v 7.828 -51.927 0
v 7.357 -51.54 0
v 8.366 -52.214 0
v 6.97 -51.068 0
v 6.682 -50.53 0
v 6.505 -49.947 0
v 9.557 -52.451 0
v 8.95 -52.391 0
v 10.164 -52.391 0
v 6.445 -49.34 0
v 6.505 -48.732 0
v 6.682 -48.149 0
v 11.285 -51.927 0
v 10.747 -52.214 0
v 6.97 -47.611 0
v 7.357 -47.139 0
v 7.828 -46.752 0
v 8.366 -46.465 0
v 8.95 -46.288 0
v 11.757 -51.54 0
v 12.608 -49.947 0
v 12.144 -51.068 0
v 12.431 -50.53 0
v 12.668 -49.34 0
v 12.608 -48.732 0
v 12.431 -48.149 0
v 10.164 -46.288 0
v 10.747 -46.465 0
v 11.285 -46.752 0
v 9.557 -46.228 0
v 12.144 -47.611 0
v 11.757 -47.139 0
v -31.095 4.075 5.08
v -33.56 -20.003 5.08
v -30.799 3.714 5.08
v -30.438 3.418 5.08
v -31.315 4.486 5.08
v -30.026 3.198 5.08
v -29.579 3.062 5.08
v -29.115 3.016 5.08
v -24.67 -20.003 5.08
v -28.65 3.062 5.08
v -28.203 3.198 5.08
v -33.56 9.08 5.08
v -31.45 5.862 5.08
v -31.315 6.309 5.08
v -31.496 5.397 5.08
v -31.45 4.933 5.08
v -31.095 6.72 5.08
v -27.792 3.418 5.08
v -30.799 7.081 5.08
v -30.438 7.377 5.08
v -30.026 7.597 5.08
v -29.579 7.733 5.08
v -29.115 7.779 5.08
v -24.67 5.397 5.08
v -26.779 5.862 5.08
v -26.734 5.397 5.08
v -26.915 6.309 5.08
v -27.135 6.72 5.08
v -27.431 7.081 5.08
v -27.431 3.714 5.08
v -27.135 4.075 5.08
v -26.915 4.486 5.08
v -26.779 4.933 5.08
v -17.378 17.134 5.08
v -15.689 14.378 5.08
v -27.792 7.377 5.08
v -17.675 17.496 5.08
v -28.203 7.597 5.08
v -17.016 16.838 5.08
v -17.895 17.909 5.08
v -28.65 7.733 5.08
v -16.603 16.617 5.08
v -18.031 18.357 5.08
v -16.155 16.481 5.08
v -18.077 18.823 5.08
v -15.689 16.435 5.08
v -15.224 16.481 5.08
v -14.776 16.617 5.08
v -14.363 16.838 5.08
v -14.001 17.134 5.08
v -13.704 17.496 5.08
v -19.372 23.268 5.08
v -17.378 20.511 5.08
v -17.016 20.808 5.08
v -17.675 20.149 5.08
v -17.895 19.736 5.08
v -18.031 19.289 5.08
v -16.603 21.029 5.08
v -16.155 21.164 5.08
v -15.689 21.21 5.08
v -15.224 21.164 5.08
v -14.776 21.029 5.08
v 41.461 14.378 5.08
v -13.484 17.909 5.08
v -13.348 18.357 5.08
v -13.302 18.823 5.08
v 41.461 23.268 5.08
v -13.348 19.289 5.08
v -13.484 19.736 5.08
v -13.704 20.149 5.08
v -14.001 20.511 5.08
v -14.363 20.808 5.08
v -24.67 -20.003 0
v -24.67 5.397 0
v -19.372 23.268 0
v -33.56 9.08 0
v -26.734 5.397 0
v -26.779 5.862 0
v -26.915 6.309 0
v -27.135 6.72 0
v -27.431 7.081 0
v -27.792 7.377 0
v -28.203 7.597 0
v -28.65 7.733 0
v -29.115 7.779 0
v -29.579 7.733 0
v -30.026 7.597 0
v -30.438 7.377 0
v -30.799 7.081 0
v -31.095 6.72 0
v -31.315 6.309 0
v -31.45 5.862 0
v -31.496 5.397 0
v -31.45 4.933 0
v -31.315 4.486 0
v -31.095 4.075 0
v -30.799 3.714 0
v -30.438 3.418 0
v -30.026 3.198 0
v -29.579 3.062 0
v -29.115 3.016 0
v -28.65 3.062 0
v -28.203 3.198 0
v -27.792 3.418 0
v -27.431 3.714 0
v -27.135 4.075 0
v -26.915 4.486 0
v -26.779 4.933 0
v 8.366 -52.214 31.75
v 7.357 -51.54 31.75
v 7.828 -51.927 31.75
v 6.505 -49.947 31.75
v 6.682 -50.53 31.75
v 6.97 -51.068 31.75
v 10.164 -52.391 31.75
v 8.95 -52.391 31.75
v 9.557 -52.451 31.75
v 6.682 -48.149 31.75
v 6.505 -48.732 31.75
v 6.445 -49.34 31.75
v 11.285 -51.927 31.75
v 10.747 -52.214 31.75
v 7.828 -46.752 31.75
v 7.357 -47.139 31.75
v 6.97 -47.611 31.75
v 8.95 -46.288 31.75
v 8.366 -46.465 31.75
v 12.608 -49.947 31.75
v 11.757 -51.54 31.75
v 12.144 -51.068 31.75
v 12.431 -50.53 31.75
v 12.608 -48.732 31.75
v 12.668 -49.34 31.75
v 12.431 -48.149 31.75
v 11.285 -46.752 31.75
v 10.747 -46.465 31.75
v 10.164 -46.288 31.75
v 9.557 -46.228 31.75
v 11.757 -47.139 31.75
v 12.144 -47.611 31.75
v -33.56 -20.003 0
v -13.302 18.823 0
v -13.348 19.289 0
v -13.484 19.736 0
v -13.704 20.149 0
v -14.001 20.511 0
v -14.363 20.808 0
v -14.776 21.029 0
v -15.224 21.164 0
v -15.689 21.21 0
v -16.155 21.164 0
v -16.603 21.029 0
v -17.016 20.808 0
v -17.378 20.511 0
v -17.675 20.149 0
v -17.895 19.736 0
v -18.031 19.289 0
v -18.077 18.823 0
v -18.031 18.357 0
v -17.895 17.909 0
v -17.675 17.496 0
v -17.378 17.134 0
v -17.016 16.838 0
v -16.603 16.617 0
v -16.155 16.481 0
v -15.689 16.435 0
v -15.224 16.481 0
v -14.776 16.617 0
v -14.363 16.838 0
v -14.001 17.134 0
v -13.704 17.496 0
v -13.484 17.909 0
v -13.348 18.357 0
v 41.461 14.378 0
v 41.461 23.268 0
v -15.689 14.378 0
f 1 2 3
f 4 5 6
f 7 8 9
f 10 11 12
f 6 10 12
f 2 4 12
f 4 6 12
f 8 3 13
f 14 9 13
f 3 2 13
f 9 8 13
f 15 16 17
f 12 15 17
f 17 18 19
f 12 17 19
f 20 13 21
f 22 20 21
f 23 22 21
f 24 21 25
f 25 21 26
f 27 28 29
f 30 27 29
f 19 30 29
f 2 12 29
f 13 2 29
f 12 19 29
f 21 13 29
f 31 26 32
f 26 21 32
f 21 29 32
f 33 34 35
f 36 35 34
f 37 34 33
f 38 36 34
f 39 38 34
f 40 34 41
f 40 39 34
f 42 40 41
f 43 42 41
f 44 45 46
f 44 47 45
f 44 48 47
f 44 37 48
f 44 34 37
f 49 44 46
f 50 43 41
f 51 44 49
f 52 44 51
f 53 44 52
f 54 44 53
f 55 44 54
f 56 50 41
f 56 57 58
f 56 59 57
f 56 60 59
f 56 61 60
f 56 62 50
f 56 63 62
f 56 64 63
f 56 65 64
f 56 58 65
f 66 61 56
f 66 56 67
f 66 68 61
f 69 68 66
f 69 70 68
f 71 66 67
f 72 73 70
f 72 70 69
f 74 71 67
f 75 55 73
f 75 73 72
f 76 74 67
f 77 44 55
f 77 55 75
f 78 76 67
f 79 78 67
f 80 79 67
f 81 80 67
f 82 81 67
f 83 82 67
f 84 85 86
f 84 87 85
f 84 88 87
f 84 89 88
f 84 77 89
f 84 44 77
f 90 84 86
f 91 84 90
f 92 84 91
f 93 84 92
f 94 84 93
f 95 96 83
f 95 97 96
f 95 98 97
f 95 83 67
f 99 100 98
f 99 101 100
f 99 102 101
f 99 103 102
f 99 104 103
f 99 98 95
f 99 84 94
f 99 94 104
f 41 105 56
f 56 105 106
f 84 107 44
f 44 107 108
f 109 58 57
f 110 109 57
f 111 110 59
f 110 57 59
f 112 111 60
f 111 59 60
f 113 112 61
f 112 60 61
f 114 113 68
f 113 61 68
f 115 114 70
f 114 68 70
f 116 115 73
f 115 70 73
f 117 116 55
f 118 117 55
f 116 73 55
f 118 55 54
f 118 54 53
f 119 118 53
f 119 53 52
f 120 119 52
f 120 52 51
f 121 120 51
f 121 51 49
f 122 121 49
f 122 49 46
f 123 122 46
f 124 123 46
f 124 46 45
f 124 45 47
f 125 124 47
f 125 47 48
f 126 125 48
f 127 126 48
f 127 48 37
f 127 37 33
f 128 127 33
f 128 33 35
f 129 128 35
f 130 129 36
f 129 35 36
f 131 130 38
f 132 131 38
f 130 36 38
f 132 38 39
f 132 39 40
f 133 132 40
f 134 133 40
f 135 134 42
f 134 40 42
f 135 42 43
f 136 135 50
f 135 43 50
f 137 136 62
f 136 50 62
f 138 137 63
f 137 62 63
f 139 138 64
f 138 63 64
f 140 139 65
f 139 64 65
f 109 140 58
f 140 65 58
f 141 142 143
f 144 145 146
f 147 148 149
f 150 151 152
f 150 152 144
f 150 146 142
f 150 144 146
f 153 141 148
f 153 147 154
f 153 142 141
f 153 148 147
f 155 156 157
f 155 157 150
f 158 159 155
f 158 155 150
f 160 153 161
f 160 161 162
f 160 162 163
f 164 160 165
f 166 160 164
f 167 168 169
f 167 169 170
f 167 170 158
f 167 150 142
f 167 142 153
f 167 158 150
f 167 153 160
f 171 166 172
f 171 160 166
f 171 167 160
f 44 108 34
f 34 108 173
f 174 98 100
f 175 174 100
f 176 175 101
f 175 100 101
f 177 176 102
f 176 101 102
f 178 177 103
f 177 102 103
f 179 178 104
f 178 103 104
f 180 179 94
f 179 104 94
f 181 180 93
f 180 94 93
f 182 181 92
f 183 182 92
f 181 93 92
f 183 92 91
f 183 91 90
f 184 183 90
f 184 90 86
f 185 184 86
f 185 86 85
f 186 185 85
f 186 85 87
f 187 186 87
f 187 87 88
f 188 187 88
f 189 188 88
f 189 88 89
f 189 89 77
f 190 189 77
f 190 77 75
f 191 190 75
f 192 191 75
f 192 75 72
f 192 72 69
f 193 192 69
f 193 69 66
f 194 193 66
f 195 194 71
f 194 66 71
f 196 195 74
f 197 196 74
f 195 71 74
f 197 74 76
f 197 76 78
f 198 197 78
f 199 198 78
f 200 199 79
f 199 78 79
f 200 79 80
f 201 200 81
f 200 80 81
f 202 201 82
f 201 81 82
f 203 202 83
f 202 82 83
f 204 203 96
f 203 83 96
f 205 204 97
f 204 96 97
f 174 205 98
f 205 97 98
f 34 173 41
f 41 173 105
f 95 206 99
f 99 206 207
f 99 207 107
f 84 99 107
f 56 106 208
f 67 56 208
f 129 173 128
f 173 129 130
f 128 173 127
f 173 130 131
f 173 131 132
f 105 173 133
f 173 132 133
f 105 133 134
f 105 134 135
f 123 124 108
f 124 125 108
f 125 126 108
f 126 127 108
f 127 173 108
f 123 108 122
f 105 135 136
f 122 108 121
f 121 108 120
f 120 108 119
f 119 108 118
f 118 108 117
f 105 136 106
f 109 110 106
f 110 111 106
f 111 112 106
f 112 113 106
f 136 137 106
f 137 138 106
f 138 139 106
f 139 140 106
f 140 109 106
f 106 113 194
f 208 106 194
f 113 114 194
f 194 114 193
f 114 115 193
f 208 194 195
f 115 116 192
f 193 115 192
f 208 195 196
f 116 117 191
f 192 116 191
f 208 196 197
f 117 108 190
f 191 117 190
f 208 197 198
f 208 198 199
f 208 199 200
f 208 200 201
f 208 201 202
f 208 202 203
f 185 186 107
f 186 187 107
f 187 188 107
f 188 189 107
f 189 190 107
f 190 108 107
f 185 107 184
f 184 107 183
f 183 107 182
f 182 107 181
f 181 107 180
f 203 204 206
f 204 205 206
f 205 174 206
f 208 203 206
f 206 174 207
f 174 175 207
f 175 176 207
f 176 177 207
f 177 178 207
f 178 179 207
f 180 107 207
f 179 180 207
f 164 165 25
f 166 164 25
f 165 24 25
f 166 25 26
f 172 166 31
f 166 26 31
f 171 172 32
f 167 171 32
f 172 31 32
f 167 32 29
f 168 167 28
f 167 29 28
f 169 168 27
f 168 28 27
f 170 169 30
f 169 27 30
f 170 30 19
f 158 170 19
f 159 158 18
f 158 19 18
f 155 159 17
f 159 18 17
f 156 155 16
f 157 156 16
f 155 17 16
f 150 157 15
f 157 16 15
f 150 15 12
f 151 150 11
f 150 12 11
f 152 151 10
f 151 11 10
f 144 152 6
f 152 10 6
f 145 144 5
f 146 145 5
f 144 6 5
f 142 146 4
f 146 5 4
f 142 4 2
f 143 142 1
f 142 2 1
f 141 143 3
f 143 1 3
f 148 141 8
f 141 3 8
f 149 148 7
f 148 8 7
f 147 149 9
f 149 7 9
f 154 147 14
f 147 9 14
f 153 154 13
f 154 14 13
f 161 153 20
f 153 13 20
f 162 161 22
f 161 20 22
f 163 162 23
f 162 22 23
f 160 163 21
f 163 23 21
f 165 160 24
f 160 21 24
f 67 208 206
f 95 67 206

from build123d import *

# Parameters (mm, degrees)
F0_W      = 57.15
F0_H      = 8.89
F0_W_2    = 8.89
F0_H_2    = 25.4
F0_R      = 3.1115
F1_DEPTH  = 5.08
F2_R      = 2.38125
F2_R_2    = 2.3876
F3_DEPTH  = 5.081
F1_FACE_R = 3.1115
F4_DEPTH  = 26.67


with BuildPart() as f1:
    # F0 (on Top) → F1 (new body)
    with BuildSketch(Plane.XY):
        with Locations((12.885505, 18.822755)):
            Rectangle(F0_W, F0_H)
        with Locations((-29.114751, -7.302501)):
            Rectangle(F0_W_2, F0_H_2)
        Polygon((-15.689495, 14.377755), (-15.689495, 23.267755), (-19.371853, 23.267755), (-26.465802, 16.173806), (-33.559751, 9.079857), (-33.559751, 5.397499), (-24.669751, 5.397499), align=None)
        with Locations((9.55675, -49.339503)):
            Circle(F0_R)
    extrude(amount=F1_DEPTH)

    # F2 (on face) → F3 (cut, through all)
    with BuildSketch(Plane.XY.offset(5.08)):
        with Locations((-29.114751, 5.397499)):
            Circle(F2_R)
        with Locations((-15.689495, 18.822755)):
            Circle(F2_R_2)
    extrude(amount=-F3_DEPTH, mode=Mode.SUBTRACT)

    # F1_face (on face) → F4 (join)
    with BuildSketch(Plane(origin=(9.55675, -49.339503, 5.08), x_dir=(1, 0, 0), z_dir=(0, 0, 1))):
        Circle(F1_FACE_R)
    extrude(amount=F4_DEPTH)


solid = f1.part
